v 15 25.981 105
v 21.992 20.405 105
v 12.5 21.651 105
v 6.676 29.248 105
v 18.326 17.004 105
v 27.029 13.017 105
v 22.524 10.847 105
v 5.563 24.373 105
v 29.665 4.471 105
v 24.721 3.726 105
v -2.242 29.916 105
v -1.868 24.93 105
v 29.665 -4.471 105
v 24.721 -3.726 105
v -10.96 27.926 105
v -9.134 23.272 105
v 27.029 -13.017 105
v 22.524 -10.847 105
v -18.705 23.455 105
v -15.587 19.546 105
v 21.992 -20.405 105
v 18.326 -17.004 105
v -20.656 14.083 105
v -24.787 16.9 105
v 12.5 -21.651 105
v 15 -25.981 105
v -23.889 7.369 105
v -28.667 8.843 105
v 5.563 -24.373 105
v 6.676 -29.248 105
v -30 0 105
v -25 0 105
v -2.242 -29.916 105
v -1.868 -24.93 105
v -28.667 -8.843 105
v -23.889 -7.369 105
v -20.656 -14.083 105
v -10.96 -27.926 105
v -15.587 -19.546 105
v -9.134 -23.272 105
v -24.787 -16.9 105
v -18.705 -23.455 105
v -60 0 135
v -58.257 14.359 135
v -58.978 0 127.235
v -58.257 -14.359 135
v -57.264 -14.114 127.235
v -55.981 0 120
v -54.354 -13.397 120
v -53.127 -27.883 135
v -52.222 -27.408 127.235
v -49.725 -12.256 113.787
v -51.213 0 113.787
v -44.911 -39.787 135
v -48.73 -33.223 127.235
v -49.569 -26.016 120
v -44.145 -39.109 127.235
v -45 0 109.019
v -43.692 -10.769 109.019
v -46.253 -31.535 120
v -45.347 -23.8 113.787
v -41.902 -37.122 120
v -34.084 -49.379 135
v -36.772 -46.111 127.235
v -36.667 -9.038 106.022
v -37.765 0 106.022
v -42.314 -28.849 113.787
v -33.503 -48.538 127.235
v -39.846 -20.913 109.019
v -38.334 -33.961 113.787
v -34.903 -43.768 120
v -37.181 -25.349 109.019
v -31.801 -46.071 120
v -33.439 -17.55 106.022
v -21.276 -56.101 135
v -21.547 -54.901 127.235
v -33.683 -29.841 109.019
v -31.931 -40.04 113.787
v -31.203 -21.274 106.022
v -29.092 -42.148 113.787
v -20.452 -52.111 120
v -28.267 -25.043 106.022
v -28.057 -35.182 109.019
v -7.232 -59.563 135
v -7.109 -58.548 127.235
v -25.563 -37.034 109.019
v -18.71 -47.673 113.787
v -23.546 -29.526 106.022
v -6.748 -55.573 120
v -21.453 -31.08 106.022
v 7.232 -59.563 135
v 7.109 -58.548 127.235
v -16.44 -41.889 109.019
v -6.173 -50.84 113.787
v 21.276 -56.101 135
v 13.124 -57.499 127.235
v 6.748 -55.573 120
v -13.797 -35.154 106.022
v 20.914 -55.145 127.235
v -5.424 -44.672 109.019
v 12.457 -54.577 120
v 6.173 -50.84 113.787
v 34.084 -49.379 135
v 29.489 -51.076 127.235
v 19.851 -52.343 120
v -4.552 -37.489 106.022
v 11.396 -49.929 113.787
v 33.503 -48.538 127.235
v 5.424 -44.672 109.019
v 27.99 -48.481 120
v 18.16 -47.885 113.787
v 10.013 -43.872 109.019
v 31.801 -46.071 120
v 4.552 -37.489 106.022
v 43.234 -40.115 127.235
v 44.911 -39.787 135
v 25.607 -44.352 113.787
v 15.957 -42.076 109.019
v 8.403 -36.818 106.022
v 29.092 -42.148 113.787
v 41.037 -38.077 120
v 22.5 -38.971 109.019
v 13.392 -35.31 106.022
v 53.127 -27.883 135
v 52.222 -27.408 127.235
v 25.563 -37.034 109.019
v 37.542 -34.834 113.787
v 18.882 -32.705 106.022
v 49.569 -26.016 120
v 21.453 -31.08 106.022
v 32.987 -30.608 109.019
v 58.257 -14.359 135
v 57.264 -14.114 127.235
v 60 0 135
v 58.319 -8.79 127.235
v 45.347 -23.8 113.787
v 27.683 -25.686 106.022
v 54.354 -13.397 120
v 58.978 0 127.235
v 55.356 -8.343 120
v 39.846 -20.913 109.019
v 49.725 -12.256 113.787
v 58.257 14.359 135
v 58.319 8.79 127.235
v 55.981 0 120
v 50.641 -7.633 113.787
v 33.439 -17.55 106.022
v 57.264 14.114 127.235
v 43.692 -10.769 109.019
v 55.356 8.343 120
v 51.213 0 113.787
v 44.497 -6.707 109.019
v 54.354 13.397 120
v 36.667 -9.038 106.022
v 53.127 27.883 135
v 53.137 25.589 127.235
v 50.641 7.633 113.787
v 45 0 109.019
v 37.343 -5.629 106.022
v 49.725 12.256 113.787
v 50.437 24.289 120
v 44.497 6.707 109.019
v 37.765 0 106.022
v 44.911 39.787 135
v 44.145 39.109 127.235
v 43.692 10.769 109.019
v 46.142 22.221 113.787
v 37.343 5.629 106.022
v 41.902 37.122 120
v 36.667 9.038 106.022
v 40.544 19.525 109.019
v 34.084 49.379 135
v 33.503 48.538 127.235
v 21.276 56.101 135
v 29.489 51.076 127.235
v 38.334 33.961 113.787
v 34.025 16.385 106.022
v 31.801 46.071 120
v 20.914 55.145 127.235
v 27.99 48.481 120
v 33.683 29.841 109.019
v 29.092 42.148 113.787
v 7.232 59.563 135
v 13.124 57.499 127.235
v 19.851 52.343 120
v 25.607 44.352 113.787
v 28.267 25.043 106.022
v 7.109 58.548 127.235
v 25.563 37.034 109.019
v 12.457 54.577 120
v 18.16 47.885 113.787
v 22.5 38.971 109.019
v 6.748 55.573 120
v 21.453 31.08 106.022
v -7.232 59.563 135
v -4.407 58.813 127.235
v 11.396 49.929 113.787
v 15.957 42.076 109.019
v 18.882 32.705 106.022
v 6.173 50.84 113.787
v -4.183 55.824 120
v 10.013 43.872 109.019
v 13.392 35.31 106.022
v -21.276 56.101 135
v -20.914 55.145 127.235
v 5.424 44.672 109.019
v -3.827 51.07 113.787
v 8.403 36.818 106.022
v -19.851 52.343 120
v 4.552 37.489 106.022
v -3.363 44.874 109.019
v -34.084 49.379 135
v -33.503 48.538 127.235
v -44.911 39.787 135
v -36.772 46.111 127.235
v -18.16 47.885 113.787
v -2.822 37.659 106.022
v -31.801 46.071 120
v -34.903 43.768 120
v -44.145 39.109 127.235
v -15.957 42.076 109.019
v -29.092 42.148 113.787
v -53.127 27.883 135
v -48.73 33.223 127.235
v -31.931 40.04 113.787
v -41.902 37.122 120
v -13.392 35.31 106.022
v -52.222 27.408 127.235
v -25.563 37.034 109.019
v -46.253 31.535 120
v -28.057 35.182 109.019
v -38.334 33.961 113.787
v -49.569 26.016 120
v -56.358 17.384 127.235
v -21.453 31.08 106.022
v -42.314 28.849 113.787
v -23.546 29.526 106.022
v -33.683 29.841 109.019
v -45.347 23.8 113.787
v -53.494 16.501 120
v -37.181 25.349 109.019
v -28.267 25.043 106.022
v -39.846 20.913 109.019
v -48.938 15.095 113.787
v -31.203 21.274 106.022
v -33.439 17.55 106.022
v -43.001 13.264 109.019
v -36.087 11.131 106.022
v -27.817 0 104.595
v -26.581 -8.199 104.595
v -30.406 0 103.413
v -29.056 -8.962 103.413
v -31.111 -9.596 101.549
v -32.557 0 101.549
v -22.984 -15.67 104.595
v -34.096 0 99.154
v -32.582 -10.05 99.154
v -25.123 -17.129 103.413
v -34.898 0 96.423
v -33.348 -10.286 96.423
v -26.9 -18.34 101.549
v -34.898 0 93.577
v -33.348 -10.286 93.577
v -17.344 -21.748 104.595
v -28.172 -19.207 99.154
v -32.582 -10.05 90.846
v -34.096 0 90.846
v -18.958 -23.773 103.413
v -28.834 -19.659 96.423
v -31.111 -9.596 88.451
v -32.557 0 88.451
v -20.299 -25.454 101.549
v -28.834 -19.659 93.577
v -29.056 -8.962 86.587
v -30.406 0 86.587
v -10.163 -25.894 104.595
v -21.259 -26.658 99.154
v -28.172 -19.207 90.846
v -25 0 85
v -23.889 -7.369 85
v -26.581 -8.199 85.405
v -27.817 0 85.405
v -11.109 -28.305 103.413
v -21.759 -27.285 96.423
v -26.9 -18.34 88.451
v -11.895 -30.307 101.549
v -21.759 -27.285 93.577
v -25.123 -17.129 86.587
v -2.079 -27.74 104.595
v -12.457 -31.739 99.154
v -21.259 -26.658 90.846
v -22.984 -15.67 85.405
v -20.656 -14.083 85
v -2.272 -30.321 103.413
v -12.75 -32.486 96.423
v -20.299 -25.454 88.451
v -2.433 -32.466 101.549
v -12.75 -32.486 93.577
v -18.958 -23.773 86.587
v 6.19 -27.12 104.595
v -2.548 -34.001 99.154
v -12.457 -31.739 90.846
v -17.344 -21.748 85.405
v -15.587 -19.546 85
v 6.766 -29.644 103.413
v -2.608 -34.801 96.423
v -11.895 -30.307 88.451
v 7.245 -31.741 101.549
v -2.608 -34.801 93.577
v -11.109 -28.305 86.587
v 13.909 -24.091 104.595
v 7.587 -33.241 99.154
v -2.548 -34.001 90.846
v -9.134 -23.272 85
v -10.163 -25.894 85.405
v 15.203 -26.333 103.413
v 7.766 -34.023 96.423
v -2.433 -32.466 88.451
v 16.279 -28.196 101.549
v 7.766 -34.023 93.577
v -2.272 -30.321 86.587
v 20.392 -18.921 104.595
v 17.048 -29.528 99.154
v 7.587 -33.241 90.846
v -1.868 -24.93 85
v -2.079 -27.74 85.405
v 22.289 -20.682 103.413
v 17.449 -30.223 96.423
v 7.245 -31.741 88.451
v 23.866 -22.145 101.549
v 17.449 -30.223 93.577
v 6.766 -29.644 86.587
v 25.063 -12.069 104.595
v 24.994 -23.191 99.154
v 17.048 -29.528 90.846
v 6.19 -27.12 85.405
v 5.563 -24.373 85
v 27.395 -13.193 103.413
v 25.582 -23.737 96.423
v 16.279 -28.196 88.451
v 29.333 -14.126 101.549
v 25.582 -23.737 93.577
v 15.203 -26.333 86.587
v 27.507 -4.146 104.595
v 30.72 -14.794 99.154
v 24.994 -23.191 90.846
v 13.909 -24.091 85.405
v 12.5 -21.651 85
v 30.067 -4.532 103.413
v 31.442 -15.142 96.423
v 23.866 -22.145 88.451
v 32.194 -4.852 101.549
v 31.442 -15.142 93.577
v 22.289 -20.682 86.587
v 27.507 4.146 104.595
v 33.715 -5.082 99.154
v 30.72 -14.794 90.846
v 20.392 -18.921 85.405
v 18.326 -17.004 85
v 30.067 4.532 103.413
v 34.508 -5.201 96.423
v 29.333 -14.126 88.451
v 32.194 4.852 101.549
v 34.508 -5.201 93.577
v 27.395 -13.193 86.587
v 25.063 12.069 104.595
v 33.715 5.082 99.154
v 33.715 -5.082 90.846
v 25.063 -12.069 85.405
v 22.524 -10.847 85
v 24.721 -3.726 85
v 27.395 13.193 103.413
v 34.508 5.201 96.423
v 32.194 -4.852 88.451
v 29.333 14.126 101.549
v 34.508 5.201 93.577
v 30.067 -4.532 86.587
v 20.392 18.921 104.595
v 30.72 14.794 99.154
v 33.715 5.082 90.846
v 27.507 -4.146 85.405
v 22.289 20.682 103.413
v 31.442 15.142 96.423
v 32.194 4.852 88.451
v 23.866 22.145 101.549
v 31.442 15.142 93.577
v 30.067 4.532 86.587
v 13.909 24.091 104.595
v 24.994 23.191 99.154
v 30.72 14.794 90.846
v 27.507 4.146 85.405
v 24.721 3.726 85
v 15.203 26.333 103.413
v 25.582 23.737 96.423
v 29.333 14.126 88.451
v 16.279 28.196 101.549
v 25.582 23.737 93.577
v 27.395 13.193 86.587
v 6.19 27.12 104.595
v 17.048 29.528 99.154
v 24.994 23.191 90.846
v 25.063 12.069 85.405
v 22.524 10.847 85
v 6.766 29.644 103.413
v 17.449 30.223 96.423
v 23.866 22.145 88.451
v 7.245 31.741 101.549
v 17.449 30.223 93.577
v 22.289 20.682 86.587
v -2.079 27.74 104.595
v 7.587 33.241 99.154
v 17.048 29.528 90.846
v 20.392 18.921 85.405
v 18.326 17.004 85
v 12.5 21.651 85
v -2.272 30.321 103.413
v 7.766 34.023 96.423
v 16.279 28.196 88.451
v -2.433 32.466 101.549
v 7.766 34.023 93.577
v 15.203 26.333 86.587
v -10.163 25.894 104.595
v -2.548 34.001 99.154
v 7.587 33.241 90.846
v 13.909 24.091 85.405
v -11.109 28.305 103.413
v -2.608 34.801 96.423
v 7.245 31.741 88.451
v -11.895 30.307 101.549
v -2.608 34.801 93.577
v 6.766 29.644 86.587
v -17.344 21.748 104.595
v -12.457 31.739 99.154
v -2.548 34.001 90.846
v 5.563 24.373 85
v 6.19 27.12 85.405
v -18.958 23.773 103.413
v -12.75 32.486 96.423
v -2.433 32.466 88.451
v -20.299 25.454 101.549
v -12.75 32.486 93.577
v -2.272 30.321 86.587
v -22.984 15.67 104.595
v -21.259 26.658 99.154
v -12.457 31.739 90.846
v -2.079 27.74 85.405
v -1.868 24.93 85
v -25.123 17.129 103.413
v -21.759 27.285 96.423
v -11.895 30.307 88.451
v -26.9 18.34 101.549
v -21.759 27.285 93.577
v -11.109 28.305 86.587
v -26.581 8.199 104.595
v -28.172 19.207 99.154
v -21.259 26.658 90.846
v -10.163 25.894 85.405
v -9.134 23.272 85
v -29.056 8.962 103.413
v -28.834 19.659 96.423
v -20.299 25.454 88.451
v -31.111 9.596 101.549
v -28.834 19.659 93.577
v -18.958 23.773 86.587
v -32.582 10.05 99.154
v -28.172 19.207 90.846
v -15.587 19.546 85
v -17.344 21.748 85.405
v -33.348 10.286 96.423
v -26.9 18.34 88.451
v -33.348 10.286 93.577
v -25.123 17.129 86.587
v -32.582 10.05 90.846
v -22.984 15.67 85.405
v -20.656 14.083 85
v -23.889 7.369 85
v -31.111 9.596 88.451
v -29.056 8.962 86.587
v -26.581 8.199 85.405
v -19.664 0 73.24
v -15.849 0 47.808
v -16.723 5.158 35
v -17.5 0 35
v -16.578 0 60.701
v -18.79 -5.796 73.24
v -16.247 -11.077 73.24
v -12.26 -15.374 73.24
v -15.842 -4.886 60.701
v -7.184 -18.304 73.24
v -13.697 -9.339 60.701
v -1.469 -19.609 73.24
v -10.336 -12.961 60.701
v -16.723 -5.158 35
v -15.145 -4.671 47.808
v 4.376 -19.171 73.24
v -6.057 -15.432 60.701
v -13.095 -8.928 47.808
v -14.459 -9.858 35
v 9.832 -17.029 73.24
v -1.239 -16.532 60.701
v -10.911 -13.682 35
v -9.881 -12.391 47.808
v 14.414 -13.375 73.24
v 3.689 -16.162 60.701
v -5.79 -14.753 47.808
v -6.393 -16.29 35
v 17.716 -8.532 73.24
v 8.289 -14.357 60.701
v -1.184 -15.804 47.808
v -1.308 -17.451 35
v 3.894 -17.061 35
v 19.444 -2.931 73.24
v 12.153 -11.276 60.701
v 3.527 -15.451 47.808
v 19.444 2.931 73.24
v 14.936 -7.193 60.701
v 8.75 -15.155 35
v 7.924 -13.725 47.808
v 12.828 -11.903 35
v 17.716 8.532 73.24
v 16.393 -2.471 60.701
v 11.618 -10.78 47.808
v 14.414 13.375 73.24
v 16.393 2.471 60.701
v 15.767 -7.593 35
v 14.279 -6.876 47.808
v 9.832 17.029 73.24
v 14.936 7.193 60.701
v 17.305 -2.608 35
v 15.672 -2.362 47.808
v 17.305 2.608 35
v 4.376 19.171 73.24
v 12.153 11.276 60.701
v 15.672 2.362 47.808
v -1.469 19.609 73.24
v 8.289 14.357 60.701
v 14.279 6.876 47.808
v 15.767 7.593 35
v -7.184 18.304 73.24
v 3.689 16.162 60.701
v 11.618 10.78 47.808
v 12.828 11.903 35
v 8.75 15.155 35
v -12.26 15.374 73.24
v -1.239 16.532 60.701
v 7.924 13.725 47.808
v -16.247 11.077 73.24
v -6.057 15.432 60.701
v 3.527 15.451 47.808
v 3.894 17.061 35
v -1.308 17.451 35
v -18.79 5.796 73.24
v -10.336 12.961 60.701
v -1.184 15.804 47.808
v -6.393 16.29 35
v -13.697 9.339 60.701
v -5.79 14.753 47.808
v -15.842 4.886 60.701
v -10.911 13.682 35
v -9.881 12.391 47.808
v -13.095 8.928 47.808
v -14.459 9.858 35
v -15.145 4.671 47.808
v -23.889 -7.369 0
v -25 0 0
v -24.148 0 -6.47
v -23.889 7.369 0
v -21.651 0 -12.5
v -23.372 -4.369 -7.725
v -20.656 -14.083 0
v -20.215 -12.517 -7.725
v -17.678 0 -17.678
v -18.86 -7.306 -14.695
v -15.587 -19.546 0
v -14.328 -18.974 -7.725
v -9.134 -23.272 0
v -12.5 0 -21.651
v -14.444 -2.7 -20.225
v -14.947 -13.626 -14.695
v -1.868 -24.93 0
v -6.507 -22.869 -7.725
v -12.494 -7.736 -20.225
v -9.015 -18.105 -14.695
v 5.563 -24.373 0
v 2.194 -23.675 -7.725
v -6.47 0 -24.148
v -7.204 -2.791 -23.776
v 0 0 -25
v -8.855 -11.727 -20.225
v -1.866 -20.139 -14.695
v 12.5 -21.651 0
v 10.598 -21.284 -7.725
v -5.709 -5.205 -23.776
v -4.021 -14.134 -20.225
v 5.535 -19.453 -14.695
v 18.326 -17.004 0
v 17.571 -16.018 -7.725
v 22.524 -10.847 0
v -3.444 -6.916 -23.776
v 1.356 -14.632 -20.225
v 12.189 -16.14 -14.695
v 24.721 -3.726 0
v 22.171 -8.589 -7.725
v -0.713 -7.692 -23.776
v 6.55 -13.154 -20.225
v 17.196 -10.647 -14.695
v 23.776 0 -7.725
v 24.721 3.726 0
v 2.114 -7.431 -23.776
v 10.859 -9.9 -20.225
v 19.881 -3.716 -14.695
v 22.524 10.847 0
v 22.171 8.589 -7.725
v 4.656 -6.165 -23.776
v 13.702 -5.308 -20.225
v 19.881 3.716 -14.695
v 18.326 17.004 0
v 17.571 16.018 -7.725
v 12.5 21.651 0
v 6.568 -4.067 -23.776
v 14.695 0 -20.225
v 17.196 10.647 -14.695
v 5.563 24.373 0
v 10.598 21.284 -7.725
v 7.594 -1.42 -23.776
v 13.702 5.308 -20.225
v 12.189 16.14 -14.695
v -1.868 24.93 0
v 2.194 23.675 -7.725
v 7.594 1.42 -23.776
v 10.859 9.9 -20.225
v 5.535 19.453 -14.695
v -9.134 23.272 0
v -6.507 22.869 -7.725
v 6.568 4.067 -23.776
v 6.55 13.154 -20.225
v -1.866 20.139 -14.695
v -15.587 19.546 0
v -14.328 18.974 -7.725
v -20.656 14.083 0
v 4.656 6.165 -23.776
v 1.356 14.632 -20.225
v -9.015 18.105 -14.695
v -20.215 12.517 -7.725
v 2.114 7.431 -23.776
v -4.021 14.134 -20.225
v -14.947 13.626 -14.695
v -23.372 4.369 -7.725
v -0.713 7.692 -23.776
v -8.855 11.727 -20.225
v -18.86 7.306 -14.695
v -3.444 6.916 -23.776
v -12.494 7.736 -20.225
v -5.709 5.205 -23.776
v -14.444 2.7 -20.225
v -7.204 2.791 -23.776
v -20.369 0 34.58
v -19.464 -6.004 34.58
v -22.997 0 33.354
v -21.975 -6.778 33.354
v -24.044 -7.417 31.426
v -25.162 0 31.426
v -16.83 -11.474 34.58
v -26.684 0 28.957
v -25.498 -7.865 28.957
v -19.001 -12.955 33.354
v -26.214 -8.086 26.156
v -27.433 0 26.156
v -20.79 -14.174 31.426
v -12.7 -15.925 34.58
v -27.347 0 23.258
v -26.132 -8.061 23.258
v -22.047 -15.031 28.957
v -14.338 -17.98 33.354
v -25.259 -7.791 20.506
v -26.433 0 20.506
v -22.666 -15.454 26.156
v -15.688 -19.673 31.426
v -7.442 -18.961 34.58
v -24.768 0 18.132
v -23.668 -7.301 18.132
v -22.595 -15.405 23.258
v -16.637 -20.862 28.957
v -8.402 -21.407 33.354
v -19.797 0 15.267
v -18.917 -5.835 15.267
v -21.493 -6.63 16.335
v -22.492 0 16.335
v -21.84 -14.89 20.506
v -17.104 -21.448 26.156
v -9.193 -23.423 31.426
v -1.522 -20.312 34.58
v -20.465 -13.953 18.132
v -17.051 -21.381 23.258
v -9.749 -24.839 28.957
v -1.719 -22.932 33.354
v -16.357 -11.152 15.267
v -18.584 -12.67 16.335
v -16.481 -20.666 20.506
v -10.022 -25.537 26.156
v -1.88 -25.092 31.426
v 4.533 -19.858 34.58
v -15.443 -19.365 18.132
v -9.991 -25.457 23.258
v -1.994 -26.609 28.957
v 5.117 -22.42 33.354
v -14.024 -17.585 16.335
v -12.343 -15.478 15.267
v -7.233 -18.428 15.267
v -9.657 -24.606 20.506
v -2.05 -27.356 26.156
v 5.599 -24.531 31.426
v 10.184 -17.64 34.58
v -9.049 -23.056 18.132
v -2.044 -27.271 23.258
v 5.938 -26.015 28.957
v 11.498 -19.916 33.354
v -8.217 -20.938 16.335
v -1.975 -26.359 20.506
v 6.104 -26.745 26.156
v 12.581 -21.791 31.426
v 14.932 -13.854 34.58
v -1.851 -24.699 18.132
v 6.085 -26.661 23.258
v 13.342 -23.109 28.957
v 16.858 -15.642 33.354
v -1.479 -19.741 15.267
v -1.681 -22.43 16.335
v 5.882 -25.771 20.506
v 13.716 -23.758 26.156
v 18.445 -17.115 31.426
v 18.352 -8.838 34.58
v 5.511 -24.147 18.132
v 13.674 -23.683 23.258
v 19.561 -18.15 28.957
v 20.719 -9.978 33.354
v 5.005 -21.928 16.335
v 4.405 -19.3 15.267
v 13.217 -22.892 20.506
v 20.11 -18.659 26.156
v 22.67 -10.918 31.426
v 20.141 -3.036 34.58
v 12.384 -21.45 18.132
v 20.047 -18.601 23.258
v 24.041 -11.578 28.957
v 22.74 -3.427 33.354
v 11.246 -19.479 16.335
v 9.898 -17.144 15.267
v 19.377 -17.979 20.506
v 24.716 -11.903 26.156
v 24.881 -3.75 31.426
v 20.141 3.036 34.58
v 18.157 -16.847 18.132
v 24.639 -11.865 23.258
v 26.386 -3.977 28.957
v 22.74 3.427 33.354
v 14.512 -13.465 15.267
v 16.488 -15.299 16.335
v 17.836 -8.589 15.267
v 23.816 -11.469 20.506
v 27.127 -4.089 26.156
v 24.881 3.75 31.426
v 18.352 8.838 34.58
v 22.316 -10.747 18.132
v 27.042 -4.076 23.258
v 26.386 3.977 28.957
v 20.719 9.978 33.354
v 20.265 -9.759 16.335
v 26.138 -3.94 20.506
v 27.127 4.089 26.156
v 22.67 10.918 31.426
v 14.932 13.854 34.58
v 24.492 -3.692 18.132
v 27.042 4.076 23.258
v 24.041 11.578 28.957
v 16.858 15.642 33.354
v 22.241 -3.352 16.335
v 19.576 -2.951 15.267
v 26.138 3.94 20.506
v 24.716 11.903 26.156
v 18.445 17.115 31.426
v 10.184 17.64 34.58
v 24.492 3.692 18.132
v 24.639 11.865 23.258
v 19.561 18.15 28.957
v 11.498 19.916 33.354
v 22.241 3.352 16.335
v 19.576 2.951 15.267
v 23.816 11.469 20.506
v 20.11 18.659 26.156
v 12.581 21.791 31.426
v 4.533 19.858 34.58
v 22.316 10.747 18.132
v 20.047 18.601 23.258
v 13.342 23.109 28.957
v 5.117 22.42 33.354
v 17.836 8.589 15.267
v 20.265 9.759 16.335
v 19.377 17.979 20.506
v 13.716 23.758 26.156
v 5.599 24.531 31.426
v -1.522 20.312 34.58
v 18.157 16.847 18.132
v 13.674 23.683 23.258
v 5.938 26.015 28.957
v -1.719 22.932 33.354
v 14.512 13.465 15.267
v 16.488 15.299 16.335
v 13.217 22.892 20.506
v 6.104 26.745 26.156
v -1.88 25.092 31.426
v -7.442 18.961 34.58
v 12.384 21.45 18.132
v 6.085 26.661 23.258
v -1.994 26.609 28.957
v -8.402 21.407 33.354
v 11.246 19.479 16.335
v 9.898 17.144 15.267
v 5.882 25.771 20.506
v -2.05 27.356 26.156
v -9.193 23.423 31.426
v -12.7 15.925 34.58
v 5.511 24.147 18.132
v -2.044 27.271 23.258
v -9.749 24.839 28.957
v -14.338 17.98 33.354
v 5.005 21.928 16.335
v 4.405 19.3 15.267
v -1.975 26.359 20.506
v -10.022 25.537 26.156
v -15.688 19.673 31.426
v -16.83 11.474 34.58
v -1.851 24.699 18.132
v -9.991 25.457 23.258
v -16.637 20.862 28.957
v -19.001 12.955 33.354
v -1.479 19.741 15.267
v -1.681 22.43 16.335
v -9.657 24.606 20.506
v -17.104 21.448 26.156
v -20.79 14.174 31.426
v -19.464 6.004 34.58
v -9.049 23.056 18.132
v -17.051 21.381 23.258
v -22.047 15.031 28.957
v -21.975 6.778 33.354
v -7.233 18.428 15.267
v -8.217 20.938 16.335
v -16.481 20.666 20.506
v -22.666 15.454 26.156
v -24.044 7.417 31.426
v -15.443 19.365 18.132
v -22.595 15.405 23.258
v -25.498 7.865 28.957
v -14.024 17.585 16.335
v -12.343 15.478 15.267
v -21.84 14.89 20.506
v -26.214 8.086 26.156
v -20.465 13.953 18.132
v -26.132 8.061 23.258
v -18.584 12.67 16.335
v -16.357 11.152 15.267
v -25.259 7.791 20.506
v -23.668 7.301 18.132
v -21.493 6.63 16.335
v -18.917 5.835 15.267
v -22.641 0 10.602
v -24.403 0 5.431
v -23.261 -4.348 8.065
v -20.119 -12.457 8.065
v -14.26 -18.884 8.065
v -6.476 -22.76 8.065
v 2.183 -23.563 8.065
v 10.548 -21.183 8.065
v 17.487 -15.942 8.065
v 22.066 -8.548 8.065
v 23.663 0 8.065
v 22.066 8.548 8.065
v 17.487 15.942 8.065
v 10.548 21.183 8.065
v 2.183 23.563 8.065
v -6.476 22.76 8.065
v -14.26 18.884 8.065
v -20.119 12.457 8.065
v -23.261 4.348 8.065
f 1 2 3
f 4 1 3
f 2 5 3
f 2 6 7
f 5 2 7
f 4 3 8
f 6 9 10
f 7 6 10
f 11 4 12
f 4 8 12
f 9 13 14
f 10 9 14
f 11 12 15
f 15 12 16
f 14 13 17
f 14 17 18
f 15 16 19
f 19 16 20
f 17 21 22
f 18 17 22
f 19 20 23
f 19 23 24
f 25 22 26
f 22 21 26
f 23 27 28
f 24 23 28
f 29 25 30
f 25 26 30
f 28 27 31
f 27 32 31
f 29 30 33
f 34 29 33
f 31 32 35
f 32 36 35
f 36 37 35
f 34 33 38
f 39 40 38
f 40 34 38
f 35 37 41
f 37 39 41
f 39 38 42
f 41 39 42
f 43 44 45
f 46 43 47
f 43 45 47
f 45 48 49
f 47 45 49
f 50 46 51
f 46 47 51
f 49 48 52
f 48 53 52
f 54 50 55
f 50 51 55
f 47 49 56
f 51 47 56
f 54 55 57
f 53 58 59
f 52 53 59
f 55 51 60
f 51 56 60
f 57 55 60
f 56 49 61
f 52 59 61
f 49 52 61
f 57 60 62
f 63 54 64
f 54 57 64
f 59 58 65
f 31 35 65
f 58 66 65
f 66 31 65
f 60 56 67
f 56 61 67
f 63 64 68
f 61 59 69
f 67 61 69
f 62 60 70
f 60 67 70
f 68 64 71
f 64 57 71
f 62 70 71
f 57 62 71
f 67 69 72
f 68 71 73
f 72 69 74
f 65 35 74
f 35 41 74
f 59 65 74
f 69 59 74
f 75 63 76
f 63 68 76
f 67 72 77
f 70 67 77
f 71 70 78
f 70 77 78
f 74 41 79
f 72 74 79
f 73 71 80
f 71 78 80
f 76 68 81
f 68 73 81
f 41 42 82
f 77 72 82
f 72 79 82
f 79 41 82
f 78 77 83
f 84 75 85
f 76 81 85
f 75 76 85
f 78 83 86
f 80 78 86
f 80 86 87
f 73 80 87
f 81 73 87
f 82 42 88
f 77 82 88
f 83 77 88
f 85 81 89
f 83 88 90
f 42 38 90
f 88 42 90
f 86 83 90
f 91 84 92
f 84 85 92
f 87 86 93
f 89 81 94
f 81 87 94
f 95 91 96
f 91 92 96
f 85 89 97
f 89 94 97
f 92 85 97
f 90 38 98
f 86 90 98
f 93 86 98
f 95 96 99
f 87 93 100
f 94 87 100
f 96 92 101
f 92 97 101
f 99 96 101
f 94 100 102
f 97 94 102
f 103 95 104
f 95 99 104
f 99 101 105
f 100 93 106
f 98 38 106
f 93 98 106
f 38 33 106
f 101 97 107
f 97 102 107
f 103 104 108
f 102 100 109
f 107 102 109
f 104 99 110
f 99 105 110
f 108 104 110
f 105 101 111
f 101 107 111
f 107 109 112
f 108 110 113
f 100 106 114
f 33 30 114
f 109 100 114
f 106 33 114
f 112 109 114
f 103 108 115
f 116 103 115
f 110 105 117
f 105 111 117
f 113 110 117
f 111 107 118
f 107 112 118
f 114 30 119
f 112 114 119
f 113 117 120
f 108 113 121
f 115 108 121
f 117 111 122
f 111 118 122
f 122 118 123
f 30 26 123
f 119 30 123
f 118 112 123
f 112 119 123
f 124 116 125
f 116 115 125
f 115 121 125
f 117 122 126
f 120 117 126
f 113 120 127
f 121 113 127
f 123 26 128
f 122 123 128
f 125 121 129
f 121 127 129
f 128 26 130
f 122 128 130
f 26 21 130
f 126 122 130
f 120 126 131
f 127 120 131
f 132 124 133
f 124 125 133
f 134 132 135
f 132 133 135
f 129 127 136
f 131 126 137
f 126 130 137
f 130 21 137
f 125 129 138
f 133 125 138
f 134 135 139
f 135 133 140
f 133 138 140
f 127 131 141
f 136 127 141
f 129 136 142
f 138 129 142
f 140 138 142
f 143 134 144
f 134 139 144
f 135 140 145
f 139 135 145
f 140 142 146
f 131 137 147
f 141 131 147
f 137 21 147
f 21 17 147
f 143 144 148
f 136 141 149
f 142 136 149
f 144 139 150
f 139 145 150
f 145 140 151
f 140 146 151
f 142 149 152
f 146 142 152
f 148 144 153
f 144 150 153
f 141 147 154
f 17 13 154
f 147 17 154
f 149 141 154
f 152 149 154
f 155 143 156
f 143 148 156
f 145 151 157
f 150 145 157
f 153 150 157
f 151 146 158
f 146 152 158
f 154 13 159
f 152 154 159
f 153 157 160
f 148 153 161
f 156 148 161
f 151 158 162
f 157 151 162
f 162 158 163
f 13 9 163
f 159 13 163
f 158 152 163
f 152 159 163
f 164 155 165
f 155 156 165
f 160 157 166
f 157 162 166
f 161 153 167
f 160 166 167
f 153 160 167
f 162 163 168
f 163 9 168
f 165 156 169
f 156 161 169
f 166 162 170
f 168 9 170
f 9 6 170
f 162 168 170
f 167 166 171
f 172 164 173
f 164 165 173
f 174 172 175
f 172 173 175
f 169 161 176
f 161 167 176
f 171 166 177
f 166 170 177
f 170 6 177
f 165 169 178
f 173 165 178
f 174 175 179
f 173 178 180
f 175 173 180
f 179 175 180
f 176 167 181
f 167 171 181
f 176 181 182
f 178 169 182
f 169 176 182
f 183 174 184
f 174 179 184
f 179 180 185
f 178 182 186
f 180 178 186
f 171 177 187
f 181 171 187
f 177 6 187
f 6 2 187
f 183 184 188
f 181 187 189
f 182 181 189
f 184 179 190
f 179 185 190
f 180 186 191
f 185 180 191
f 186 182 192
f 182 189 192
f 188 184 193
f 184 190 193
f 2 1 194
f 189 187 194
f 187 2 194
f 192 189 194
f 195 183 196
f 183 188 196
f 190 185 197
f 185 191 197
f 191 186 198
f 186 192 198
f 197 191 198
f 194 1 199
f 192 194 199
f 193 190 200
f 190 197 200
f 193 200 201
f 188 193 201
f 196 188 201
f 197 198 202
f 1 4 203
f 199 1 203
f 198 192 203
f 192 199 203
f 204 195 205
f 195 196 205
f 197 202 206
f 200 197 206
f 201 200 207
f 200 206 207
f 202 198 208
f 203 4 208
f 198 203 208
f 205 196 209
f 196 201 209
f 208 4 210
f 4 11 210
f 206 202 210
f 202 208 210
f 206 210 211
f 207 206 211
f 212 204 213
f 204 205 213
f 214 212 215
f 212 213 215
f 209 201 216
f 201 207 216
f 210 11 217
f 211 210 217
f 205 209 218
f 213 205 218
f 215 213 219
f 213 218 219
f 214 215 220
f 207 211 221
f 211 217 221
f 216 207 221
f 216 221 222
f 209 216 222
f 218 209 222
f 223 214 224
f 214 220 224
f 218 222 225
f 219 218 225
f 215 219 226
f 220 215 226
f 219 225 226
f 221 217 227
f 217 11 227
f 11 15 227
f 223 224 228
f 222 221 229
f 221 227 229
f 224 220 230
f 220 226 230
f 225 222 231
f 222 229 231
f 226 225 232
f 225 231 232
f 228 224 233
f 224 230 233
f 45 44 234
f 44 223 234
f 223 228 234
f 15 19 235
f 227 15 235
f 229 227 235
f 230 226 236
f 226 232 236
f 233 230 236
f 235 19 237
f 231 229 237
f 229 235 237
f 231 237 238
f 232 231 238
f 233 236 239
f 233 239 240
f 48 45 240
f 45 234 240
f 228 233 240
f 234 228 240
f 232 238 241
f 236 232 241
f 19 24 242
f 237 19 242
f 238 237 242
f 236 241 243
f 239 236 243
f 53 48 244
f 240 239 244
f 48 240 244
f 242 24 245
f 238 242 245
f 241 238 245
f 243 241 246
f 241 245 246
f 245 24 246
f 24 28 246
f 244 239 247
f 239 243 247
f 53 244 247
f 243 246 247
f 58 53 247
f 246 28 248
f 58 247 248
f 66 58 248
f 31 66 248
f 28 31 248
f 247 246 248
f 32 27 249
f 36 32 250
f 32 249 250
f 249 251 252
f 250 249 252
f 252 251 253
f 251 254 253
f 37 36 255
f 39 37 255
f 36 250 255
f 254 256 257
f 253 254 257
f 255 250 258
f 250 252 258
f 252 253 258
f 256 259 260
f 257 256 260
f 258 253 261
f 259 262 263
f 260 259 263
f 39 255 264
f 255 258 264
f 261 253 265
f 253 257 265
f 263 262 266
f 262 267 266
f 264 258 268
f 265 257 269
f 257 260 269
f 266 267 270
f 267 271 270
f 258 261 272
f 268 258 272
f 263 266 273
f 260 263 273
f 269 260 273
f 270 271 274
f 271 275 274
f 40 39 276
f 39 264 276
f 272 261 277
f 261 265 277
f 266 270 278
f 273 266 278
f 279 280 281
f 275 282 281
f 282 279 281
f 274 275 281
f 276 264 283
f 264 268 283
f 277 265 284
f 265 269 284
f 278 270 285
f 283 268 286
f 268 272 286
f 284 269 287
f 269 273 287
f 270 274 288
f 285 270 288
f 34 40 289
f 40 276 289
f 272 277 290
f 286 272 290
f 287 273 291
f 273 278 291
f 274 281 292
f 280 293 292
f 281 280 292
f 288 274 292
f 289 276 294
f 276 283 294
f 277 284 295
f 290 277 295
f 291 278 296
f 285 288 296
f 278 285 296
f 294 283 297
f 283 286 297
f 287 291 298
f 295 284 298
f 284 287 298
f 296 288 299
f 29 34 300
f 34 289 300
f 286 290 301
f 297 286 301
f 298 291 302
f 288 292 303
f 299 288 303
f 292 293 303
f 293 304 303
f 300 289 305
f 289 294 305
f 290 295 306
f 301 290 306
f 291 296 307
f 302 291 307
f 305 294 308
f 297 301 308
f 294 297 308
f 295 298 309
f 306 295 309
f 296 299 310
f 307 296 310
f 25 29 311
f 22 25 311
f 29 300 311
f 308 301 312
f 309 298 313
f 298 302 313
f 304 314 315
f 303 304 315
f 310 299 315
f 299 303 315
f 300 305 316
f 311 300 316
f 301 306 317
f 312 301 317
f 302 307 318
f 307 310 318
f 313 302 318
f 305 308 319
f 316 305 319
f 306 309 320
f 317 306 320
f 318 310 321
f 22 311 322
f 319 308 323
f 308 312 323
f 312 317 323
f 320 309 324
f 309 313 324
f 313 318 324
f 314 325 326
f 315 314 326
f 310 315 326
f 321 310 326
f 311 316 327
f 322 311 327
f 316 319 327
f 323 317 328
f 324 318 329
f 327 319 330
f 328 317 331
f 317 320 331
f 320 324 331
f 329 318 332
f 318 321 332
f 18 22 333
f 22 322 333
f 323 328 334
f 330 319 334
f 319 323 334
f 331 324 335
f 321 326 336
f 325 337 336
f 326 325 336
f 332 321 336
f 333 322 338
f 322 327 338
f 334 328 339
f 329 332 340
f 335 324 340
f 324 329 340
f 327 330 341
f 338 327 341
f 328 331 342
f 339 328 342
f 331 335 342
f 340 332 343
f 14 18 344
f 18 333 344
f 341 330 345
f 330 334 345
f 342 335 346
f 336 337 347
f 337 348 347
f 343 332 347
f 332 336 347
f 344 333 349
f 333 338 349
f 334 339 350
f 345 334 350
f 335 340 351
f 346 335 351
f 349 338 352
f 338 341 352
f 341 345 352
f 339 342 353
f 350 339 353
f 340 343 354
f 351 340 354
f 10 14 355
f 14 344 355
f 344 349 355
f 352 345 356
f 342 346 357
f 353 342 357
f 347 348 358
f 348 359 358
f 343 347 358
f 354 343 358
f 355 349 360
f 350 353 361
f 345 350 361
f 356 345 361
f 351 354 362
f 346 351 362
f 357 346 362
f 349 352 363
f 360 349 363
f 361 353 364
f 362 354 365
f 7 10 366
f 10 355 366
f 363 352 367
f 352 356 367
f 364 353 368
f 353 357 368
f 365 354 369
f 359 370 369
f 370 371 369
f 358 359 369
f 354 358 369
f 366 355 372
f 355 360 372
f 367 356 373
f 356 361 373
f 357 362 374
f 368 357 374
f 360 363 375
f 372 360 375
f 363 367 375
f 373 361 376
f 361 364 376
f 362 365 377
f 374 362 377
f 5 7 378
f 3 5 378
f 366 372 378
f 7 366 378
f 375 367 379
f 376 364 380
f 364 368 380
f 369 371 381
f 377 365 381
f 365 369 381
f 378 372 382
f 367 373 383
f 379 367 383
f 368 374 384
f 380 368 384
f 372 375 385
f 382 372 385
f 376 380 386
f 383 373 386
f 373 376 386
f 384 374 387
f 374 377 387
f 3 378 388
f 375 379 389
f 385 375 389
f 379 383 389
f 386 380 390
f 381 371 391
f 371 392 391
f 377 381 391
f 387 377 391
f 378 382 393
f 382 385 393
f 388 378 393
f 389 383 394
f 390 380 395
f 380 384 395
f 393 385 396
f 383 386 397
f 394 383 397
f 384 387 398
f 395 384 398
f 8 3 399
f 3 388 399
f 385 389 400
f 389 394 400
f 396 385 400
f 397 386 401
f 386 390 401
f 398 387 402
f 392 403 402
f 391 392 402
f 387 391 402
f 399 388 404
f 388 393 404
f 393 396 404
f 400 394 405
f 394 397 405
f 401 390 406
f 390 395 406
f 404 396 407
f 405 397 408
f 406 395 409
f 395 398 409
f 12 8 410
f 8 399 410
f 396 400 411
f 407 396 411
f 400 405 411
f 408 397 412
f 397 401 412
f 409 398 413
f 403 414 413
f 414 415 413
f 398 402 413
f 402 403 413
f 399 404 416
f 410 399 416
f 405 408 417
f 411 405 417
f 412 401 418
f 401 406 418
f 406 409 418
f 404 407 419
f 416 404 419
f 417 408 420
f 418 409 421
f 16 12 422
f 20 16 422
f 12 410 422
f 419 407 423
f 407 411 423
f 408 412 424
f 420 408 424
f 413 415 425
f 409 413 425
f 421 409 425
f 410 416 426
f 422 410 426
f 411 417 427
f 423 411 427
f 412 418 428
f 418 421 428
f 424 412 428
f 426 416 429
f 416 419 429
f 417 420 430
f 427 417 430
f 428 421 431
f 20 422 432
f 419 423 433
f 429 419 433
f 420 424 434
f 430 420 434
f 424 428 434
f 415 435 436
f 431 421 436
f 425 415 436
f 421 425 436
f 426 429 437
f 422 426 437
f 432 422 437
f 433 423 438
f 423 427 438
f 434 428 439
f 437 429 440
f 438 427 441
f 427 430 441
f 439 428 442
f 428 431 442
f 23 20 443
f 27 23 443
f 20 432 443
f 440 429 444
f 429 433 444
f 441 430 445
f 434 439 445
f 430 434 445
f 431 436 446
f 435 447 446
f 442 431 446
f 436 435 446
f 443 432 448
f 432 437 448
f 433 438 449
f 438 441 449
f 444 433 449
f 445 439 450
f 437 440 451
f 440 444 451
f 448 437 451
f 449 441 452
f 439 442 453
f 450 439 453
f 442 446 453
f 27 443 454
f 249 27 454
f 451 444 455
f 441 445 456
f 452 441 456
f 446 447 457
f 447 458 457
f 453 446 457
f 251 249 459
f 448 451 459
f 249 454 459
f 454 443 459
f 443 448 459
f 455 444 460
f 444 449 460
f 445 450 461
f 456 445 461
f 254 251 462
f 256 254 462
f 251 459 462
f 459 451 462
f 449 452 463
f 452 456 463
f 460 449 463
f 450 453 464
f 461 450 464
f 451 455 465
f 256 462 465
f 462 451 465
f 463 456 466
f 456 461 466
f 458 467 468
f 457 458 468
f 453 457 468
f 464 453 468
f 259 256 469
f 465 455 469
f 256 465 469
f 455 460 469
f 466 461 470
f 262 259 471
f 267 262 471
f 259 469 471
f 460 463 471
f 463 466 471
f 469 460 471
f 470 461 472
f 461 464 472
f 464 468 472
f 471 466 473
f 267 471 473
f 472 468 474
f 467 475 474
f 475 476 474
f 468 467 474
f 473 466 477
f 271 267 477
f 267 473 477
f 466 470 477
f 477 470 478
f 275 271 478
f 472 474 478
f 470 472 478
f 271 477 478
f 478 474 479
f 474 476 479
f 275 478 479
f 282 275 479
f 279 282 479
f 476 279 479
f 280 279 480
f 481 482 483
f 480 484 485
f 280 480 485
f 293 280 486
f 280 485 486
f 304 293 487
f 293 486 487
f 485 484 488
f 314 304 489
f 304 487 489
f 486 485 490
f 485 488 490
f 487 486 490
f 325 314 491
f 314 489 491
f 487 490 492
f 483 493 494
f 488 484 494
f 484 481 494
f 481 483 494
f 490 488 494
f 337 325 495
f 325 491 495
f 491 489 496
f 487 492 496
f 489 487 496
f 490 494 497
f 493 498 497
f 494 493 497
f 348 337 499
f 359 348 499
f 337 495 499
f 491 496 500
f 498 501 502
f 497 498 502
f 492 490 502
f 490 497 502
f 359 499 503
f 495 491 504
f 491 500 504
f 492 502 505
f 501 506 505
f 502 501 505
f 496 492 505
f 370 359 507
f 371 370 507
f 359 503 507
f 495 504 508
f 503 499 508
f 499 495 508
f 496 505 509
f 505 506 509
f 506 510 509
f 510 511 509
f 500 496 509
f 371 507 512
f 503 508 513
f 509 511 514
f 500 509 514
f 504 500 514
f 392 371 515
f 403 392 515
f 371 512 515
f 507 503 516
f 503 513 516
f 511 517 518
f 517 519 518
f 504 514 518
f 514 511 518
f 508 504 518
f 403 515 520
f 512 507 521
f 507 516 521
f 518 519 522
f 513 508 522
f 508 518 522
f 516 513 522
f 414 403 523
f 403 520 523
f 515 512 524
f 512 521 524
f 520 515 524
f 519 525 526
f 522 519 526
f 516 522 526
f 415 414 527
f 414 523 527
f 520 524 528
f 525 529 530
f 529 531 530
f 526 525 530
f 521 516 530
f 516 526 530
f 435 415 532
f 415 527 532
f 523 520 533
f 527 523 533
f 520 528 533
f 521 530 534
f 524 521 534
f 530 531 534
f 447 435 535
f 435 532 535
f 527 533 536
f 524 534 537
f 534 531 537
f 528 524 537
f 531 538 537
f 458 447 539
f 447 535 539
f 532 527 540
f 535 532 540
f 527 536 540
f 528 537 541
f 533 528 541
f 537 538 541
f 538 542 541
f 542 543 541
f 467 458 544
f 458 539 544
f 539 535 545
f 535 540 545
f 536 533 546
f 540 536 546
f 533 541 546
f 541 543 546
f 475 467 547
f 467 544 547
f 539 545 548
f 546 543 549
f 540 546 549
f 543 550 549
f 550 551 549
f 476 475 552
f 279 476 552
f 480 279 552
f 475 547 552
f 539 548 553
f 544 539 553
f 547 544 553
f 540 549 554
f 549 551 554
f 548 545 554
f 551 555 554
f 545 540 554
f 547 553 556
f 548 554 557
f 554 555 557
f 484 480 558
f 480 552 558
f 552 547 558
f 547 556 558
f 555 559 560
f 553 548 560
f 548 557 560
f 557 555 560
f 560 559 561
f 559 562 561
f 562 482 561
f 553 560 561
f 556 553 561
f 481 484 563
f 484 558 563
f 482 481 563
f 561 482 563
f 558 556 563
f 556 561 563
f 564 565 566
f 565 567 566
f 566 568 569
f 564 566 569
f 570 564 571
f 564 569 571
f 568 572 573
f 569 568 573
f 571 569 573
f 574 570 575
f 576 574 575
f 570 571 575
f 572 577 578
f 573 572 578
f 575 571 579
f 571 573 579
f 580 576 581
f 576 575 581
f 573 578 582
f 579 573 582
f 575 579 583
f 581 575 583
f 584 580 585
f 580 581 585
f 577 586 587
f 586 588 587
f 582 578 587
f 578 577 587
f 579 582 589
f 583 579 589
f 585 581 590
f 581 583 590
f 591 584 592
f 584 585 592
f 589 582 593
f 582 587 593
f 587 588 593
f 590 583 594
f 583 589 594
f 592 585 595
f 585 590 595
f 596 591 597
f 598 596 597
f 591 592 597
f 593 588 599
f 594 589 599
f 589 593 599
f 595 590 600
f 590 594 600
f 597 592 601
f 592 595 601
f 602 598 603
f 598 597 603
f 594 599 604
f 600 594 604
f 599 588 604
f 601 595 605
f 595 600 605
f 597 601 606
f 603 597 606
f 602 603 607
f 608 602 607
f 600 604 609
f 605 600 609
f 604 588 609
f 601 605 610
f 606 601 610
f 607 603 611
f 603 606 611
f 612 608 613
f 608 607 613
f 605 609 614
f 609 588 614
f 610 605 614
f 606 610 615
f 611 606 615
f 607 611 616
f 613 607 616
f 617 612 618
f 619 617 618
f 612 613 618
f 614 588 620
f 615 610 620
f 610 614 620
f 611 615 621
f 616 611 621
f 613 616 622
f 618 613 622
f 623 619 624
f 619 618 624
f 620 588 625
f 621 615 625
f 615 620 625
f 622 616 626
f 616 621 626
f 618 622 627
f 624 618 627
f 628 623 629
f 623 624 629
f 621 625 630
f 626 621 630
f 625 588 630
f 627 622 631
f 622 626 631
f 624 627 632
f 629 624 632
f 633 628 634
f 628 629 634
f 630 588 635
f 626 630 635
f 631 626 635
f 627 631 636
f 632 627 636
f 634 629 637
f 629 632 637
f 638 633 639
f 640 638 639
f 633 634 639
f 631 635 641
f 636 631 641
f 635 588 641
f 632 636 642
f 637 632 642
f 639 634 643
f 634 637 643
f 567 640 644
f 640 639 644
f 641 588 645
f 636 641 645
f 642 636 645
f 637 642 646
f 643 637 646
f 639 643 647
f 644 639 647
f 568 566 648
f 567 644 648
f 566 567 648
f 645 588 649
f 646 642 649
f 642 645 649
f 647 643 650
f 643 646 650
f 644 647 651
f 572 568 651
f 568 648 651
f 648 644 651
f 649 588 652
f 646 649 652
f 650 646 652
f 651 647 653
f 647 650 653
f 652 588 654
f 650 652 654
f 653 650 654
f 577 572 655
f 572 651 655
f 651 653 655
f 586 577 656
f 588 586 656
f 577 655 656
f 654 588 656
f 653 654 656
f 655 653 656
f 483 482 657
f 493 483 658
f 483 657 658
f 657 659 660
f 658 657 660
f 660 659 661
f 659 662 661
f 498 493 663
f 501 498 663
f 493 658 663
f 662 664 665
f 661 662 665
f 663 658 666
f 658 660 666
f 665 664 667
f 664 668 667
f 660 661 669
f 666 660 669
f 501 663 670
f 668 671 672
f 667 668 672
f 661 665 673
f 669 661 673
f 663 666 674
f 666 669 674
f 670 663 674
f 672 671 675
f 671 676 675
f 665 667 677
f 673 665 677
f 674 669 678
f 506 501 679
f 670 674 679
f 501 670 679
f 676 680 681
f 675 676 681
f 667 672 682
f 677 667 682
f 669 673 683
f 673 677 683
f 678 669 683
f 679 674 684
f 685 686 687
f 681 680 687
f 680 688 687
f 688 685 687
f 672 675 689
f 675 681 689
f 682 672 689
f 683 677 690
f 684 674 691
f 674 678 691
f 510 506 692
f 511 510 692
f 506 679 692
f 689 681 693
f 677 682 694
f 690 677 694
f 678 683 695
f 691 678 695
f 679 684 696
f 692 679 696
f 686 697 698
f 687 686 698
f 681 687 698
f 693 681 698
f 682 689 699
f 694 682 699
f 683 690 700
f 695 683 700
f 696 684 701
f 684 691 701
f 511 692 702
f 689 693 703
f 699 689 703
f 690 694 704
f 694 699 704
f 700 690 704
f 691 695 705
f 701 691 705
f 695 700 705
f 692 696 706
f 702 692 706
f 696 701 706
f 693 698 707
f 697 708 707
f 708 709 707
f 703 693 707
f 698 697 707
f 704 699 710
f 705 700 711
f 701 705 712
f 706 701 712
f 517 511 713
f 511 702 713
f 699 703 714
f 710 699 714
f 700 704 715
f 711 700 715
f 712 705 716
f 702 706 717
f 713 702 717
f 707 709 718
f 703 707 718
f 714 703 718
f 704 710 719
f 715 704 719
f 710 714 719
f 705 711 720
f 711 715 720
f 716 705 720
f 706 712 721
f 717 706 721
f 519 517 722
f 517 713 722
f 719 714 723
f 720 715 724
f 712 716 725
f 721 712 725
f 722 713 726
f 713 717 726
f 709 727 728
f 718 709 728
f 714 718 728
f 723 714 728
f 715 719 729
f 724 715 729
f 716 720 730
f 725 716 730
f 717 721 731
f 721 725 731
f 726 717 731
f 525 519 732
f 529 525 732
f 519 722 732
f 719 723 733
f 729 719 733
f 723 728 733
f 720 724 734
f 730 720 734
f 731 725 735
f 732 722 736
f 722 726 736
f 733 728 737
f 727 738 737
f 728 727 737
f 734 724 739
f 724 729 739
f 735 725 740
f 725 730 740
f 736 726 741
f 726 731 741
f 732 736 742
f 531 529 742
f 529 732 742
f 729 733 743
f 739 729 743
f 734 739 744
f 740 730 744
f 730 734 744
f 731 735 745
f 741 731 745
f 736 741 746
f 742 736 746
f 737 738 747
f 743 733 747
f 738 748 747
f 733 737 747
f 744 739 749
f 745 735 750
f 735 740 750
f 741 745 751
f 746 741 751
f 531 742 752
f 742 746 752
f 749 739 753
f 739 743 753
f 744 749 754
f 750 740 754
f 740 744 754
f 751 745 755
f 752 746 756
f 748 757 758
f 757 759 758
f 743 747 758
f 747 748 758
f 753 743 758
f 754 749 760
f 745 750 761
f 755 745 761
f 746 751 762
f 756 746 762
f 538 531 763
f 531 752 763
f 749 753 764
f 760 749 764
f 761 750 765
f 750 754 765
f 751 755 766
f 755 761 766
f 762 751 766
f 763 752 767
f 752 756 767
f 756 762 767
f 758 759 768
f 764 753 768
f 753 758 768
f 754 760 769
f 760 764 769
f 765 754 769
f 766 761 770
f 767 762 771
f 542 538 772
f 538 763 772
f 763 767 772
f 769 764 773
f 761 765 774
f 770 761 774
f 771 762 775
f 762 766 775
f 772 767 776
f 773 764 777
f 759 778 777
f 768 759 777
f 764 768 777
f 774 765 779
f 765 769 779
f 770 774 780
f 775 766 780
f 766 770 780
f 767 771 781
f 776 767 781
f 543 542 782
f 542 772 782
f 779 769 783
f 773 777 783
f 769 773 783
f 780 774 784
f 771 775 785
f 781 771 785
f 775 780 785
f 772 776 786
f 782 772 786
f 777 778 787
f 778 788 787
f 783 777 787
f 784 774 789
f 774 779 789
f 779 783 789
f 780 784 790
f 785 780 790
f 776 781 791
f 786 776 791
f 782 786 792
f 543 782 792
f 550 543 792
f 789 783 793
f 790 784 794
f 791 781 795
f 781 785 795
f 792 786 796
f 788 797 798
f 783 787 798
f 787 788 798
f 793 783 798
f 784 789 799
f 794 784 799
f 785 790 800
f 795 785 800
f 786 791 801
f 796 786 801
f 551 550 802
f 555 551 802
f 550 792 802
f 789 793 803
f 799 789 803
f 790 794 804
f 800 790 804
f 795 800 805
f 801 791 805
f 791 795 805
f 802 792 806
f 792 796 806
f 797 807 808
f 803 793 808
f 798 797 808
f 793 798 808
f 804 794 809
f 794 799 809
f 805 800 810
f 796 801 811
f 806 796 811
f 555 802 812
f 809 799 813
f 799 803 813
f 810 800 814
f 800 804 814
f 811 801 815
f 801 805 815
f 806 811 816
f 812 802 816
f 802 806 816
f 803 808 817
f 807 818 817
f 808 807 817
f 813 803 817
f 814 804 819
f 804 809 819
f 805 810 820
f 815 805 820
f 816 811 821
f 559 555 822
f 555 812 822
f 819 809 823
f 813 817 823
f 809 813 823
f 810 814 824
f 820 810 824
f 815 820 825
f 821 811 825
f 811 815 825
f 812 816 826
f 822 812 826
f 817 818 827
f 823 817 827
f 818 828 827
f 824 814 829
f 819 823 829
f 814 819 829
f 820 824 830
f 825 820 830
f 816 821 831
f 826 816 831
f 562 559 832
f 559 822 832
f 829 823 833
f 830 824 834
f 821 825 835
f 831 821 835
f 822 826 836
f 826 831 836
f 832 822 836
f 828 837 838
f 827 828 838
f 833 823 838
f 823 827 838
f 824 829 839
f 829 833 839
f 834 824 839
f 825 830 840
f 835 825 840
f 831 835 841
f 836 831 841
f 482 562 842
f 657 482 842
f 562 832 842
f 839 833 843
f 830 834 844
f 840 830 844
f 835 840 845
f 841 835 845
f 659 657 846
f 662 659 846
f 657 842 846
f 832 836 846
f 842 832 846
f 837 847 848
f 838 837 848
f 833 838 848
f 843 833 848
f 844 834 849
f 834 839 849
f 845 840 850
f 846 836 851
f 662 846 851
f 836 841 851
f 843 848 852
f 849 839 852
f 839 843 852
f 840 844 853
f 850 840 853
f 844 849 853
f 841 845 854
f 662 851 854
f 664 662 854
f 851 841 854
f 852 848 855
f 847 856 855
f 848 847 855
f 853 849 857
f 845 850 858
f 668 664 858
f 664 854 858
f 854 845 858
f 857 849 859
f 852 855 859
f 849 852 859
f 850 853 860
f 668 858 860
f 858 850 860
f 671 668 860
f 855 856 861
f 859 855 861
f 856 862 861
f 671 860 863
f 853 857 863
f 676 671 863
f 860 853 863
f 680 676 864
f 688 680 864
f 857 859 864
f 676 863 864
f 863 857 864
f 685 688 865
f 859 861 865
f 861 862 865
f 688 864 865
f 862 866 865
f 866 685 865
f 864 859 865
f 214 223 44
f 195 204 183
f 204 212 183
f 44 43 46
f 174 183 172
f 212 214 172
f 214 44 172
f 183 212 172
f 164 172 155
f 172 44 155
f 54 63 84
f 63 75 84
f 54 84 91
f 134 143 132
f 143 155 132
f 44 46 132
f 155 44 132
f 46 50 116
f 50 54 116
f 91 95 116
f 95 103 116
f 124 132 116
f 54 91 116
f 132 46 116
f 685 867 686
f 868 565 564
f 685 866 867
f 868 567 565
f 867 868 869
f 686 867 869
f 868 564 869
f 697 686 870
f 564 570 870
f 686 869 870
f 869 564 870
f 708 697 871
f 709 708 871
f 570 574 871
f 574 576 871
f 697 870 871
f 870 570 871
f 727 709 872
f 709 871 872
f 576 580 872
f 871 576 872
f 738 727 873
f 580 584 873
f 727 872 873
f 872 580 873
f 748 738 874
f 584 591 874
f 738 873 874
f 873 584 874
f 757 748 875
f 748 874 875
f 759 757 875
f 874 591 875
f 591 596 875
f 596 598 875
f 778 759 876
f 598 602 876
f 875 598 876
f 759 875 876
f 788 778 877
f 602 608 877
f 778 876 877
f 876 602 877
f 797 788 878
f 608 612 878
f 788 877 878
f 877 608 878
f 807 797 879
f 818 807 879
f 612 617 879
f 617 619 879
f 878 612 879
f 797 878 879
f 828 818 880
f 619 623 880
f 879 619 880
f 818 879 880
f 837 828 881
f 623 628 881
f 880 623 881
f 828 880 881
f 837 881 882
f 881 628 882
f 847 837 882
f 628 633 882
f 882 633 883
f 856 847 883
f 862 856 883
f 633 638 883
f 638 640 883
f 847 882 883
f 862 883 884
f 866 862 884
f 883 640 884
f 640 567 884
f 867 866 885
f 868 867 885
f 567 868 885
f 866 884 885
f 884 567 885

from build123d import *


with BuildPart() as part:
    # Sketch1 → Revolve1 (revolve)
    with BuildSketch(Plane(origin=(0, 0, 0), x_dir=(1, 0, 0), z_dir=(0, 1, 0)), mode=Mode.PRIVATE) as revolve1_sk:
        with BuildLine():
            Line((25, -105), (0, -105))
            Line((0, -105), (0, -135))
            Line((0, -135), (60, -135))
            ThreePointArc((60, -135), (51.213203436, -113.786796564), (30, -105))
            Line((30, -105), (25, -105))
        make_face()
        with BuildLine():
            Line((25, -85), (0, -85))
            Line((0, -85), (0, -105))
            Line((0, -105), (25, -105))
            ThreePointArc((25, -105), (35, -95), (25, -85))
        make_face()
        with BuildLine():
            Line((17.5, -35), (0, -35))
            Line((0, -35), (0, -85))
            Line((0, -85), (25, -85))
            ThreePointArc((25, -85), (16.578123197, -60.70078152), (17.5, -35))
        make_face()
        with BuildLine():
            ThreePointArc((19.796695306, -15.267313286), (11.02989501, -22.435271696), (0, -25))
            Line((0, -25), (0, -35))
            Line((0, -35), (17.5, -35))
            ThreePointArc((17.5, -35), (27.432946872, -26.156099663), (19.796695306, -15.267313286))
        make_face()
        with BuildLine():
            ThreePointArc((25, 0), (17.67766953, 17.67766953), (0, 25))
            Line((0, 25), (0, -15))
            Line((0, -15), (17.5, -15))
            ThreePointArc((17.5, -15), (18.656099663, -15.067053128), (19.796695306, -15.267313286))
            ThreePointArc((19.796695306, -15.267313286), (23.663446311, -8.064819197), (25, 0))
        make_face()
        with BuildLine():
            Line((17.5, -15), (0, -15))
            Line((0, -15), (0, -25))
            ThreePointArc((0, -25), (11.02989501, -22.435271696), (19.796695306, -15.267313286))
            ThreePointArc((19.796695306, -15.267313286), (18.656099663, -15.067053128), (17.5, -15))
        make_face()
    revolve(revolve1_sk.sketch.rotate(Axis((0, 0, -25), (0, 0, 1)), 180), axis=Axis((0, 0, -25), (0, 0, 1)))


solid = part.part
